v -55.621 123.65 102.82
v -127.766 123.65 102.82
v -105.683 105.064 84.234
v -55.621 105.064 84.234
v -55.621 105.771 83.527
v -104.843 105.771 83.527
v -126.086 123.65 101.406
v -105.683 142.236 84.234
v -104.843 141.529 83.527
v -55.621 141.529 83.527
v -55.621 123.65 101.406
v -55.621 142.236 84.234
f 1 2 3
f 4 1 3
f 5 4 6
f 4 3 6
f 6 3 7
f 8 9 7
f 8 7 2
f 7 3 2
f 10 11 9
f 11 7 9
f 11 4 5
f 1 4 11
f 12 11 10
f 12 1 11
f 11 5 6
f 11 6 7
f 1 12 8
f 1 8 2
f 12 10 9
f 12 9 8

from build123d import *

# Parameters (mm, degrees)
F1_DEPTH  = 247.3
F3_DEPTH  = 300
F4_DEPTH  = 50
F5_DEPTH  = 59.1
F6_DEPTH  = 300
F7_DEPTH  = 300
F8_DEPTH  = 17.109
F9_DEPTH  = 1.9
F10_DEPTH = 1
F11_DEPTH = 3


with BuildPart() as f1:
    # F0 (on Front) → F1 (new body)
    with BuildSketch(Plane.XZ):
        Polygon((-78.8866152354, 43.4383174348), (-78.6296018241, 42.9628188217), (-78.6296018241, 102.819841868), (-127.7663317061, 102.819841868), (-96.9769939736, 76.9071934711), align=None)
        Polygon((-79.7663317061, 42.9628188217), (-97.7663317061, 76.264485822), (-127.7663317061, 101.5128188217), (-157.7663317061, 76.264485822), (-175.7663317061, 42.9628188217), align=None)
        Polygon((-127.7663317061, 101.5128188217), (-97.7663317061, 76.264485822), (-79.7663317061, 42.9628188217), (-78.6296018241, 42.9628188217), (-78.8866152354, 43.4383174348), (-96.9769939736, 76.9071934711), (-127.7663317061, 102.819841868), (-158.5556694386, 76.9071934711), (-176.9030615881, 42.9628188217), (-175.7663317061, 42.9628188217), (-157.7663317061, 76.264485822), align=None)
        Polygon((-176.9030615881, 102.819841868), (-176.9030615881, 42.9628188217), (-158.5556694386, 76.9071934711), (-127.7663317061, 102.819841868), align=None)
    extrude(amount=-F1_DEPTH)

    # F0 (on Front) → F3 (cut)
    with BuildSketch(Plane.XZ):
        Polygon((-78.8866152354, 43.4383174348), (-78.6296018241, 42.9628188217), (-78.6296018241, 102.819841868), (-127.7663317061, 102.819841868), (-96.9769939736, 76.9071934711), align=None)
    extrude(amount=-F3_DEPTH, mode=Mode.SUBTRACT)

    # F2 (on face) → F4 (join)
    with BuildSketch(Plane.YZ.offset(-78.6296018241)):
        Polygon((142.2357864376, 84.2340554304), (123.65, 102.819841868), (123.65, 101.4056283057), (141.5286796564, 83.5269486492), align=None)
        Polygon((123.65, 101.4056283057), (123.65, 102.819841868), (105.0642135624, 84.2340554304), (105.7713203436, 83.5269486492), align=None)
    extrude(amount=-F4_DEPTH)

    # F2 (on face) → F5 (join)
    with BuildSketch(Plane.YZ.offset(-78.6296018241)):
        Polygon((103.65, 42.9628188217), (123.65, 42.9628188217), (123.65, 82.819841868), (106.4784271247, 82.819841868), (105.0642135624, 82.819841868), (103.65, 82.819841868), align=None)
        Polygon((123.65, 42.9628188217), (143.65, 42.9628188217), (143.65, 82.819841868), (142.2357864376, 82.819841868), (140.8215728753, 82.819841868), (123.65, 82.819841868), align=None)
    extrude(amount=-F5_DEPTH)

    # F2 (on face) → F6 (cut)
    with BuildSketch(Plane.YZ.offset(-78.6296018241)):
        Polygon((247.3, 42.9628188217), (247.3, 102.819841868), (123.65, 102.819841868), (142.2357864376, 84.2340554304), (141.5286796564, 83.5269486492), (142.2357864376, 82.819841868), (143.65, 82.819841868), (143.65, 42.9628188217), align=None)
        Polygon((105.0642135624, 84.2340554304), (123.65, 102.819841868), (0, 102.819841868), (0, 42.9628188217), (103.65, 42.9628188217), (103.65, 82.819841868), (105.0642135624, 82.819841868), (105.7713203436, 83.5269486492), align=None)
        Polygon((123.65, 42.9628188217), (143.65, 42.9628188217), (143.65, 82.819841868), (142.2357864376, 82.819841868), (140.8215728753, 82.819841868), (123.65, 82.819841868), align=None)
        Polygon((103.65, 42.9628188217), (123.65, 42.9628188217), (123.65, 82.819841868), (106.4784271247, 82.819841868), (105.0642135624, 82.819841868), (103.65, 82.819841868), align=None)
    extrude(amount=-F6_DEPTH, mode=Mode.SUBTRACT)

    # F0 (on Front) → F7 (cut)
    with BuildSketch(Plane.XZ):
        Polygon((-176.9030615881, 102.819841868), (-176.9030615881, 42.9628188217), (-158.5556694386, 76.9071934711), (-127.7663317061, 102.819841868), align=None)
        Polygon((-127.7663317061, 101.5128188217), (-97.7663317061, 76.264485822), (-79.7663317061, 42.9628188217), (-78.6296018241, 42.9628188217), (-78.8866152354, 43.4383174348), (-96.9769939736, 76.9071934711), (-127.7663317061, 102.819841868), (-158.5556694386, 76.9071934711), (-176.9030615881, 42.9628188217), (-175.7663317061, 42.9628188217), (-157.7663317061, 76.264485822), align=None)
        Polygon((-79.7663317061, 42.9628188217), (-97.7663317061, 76.264485822), (-127.7663317061, 101.5128188217), (-157.7663317061, 76.264485822), (-175.7663317061, 42.9628188217), align=None)
    extrude(amount=-F7_DEPTH, mode=Mode.SUBTRACT)

    # F2 (on face) → F8 (join)
    with BuildSketch(Plane.YZ.offset(-78.6296018241)):
        Polygon((123.65, 101.4056283057), (123.65, 102.819841868), (105.0642135624, 84.2340554304), (105.7713203436, 83.5269486492), align=None)
        Polygon((142.2357864376, 84.2340554304), (123.65, 102.819841868), (123.65, 101.4056283057), (141.5286796564, 83.5269486492), align=None)
    extrude(amount=F8_DEPTH)

    # F9 (add): a face of the model
    f9_faces = [f1.faces().sort_by_distance(p)[0] for p in [
        (-61.5206018241, 114.6532437055, 93.2308117249),
    ]]
    extrude(f9_faces, amount=F9_DEPTH)

    # F10 (add): a face of the model
    f10_faces = [f1.faces().sort_by_distance(p)[0] for p in [
        (-59.6206018241, 114.6532437055, 93.2308117249),
    ]]
    extrude(f10_faces, amount=F10_DEPTH)

    # F11 (add): a face of the model
    f11_faces = [f1.faces().sort_by_distance(p)[0] for p in [
        (-58.6206018241, 114.6532437055, 93.2308117249),
    ]]
    extrude(f11_faces, amount=F11_DEPTH)


solid = f1.part
